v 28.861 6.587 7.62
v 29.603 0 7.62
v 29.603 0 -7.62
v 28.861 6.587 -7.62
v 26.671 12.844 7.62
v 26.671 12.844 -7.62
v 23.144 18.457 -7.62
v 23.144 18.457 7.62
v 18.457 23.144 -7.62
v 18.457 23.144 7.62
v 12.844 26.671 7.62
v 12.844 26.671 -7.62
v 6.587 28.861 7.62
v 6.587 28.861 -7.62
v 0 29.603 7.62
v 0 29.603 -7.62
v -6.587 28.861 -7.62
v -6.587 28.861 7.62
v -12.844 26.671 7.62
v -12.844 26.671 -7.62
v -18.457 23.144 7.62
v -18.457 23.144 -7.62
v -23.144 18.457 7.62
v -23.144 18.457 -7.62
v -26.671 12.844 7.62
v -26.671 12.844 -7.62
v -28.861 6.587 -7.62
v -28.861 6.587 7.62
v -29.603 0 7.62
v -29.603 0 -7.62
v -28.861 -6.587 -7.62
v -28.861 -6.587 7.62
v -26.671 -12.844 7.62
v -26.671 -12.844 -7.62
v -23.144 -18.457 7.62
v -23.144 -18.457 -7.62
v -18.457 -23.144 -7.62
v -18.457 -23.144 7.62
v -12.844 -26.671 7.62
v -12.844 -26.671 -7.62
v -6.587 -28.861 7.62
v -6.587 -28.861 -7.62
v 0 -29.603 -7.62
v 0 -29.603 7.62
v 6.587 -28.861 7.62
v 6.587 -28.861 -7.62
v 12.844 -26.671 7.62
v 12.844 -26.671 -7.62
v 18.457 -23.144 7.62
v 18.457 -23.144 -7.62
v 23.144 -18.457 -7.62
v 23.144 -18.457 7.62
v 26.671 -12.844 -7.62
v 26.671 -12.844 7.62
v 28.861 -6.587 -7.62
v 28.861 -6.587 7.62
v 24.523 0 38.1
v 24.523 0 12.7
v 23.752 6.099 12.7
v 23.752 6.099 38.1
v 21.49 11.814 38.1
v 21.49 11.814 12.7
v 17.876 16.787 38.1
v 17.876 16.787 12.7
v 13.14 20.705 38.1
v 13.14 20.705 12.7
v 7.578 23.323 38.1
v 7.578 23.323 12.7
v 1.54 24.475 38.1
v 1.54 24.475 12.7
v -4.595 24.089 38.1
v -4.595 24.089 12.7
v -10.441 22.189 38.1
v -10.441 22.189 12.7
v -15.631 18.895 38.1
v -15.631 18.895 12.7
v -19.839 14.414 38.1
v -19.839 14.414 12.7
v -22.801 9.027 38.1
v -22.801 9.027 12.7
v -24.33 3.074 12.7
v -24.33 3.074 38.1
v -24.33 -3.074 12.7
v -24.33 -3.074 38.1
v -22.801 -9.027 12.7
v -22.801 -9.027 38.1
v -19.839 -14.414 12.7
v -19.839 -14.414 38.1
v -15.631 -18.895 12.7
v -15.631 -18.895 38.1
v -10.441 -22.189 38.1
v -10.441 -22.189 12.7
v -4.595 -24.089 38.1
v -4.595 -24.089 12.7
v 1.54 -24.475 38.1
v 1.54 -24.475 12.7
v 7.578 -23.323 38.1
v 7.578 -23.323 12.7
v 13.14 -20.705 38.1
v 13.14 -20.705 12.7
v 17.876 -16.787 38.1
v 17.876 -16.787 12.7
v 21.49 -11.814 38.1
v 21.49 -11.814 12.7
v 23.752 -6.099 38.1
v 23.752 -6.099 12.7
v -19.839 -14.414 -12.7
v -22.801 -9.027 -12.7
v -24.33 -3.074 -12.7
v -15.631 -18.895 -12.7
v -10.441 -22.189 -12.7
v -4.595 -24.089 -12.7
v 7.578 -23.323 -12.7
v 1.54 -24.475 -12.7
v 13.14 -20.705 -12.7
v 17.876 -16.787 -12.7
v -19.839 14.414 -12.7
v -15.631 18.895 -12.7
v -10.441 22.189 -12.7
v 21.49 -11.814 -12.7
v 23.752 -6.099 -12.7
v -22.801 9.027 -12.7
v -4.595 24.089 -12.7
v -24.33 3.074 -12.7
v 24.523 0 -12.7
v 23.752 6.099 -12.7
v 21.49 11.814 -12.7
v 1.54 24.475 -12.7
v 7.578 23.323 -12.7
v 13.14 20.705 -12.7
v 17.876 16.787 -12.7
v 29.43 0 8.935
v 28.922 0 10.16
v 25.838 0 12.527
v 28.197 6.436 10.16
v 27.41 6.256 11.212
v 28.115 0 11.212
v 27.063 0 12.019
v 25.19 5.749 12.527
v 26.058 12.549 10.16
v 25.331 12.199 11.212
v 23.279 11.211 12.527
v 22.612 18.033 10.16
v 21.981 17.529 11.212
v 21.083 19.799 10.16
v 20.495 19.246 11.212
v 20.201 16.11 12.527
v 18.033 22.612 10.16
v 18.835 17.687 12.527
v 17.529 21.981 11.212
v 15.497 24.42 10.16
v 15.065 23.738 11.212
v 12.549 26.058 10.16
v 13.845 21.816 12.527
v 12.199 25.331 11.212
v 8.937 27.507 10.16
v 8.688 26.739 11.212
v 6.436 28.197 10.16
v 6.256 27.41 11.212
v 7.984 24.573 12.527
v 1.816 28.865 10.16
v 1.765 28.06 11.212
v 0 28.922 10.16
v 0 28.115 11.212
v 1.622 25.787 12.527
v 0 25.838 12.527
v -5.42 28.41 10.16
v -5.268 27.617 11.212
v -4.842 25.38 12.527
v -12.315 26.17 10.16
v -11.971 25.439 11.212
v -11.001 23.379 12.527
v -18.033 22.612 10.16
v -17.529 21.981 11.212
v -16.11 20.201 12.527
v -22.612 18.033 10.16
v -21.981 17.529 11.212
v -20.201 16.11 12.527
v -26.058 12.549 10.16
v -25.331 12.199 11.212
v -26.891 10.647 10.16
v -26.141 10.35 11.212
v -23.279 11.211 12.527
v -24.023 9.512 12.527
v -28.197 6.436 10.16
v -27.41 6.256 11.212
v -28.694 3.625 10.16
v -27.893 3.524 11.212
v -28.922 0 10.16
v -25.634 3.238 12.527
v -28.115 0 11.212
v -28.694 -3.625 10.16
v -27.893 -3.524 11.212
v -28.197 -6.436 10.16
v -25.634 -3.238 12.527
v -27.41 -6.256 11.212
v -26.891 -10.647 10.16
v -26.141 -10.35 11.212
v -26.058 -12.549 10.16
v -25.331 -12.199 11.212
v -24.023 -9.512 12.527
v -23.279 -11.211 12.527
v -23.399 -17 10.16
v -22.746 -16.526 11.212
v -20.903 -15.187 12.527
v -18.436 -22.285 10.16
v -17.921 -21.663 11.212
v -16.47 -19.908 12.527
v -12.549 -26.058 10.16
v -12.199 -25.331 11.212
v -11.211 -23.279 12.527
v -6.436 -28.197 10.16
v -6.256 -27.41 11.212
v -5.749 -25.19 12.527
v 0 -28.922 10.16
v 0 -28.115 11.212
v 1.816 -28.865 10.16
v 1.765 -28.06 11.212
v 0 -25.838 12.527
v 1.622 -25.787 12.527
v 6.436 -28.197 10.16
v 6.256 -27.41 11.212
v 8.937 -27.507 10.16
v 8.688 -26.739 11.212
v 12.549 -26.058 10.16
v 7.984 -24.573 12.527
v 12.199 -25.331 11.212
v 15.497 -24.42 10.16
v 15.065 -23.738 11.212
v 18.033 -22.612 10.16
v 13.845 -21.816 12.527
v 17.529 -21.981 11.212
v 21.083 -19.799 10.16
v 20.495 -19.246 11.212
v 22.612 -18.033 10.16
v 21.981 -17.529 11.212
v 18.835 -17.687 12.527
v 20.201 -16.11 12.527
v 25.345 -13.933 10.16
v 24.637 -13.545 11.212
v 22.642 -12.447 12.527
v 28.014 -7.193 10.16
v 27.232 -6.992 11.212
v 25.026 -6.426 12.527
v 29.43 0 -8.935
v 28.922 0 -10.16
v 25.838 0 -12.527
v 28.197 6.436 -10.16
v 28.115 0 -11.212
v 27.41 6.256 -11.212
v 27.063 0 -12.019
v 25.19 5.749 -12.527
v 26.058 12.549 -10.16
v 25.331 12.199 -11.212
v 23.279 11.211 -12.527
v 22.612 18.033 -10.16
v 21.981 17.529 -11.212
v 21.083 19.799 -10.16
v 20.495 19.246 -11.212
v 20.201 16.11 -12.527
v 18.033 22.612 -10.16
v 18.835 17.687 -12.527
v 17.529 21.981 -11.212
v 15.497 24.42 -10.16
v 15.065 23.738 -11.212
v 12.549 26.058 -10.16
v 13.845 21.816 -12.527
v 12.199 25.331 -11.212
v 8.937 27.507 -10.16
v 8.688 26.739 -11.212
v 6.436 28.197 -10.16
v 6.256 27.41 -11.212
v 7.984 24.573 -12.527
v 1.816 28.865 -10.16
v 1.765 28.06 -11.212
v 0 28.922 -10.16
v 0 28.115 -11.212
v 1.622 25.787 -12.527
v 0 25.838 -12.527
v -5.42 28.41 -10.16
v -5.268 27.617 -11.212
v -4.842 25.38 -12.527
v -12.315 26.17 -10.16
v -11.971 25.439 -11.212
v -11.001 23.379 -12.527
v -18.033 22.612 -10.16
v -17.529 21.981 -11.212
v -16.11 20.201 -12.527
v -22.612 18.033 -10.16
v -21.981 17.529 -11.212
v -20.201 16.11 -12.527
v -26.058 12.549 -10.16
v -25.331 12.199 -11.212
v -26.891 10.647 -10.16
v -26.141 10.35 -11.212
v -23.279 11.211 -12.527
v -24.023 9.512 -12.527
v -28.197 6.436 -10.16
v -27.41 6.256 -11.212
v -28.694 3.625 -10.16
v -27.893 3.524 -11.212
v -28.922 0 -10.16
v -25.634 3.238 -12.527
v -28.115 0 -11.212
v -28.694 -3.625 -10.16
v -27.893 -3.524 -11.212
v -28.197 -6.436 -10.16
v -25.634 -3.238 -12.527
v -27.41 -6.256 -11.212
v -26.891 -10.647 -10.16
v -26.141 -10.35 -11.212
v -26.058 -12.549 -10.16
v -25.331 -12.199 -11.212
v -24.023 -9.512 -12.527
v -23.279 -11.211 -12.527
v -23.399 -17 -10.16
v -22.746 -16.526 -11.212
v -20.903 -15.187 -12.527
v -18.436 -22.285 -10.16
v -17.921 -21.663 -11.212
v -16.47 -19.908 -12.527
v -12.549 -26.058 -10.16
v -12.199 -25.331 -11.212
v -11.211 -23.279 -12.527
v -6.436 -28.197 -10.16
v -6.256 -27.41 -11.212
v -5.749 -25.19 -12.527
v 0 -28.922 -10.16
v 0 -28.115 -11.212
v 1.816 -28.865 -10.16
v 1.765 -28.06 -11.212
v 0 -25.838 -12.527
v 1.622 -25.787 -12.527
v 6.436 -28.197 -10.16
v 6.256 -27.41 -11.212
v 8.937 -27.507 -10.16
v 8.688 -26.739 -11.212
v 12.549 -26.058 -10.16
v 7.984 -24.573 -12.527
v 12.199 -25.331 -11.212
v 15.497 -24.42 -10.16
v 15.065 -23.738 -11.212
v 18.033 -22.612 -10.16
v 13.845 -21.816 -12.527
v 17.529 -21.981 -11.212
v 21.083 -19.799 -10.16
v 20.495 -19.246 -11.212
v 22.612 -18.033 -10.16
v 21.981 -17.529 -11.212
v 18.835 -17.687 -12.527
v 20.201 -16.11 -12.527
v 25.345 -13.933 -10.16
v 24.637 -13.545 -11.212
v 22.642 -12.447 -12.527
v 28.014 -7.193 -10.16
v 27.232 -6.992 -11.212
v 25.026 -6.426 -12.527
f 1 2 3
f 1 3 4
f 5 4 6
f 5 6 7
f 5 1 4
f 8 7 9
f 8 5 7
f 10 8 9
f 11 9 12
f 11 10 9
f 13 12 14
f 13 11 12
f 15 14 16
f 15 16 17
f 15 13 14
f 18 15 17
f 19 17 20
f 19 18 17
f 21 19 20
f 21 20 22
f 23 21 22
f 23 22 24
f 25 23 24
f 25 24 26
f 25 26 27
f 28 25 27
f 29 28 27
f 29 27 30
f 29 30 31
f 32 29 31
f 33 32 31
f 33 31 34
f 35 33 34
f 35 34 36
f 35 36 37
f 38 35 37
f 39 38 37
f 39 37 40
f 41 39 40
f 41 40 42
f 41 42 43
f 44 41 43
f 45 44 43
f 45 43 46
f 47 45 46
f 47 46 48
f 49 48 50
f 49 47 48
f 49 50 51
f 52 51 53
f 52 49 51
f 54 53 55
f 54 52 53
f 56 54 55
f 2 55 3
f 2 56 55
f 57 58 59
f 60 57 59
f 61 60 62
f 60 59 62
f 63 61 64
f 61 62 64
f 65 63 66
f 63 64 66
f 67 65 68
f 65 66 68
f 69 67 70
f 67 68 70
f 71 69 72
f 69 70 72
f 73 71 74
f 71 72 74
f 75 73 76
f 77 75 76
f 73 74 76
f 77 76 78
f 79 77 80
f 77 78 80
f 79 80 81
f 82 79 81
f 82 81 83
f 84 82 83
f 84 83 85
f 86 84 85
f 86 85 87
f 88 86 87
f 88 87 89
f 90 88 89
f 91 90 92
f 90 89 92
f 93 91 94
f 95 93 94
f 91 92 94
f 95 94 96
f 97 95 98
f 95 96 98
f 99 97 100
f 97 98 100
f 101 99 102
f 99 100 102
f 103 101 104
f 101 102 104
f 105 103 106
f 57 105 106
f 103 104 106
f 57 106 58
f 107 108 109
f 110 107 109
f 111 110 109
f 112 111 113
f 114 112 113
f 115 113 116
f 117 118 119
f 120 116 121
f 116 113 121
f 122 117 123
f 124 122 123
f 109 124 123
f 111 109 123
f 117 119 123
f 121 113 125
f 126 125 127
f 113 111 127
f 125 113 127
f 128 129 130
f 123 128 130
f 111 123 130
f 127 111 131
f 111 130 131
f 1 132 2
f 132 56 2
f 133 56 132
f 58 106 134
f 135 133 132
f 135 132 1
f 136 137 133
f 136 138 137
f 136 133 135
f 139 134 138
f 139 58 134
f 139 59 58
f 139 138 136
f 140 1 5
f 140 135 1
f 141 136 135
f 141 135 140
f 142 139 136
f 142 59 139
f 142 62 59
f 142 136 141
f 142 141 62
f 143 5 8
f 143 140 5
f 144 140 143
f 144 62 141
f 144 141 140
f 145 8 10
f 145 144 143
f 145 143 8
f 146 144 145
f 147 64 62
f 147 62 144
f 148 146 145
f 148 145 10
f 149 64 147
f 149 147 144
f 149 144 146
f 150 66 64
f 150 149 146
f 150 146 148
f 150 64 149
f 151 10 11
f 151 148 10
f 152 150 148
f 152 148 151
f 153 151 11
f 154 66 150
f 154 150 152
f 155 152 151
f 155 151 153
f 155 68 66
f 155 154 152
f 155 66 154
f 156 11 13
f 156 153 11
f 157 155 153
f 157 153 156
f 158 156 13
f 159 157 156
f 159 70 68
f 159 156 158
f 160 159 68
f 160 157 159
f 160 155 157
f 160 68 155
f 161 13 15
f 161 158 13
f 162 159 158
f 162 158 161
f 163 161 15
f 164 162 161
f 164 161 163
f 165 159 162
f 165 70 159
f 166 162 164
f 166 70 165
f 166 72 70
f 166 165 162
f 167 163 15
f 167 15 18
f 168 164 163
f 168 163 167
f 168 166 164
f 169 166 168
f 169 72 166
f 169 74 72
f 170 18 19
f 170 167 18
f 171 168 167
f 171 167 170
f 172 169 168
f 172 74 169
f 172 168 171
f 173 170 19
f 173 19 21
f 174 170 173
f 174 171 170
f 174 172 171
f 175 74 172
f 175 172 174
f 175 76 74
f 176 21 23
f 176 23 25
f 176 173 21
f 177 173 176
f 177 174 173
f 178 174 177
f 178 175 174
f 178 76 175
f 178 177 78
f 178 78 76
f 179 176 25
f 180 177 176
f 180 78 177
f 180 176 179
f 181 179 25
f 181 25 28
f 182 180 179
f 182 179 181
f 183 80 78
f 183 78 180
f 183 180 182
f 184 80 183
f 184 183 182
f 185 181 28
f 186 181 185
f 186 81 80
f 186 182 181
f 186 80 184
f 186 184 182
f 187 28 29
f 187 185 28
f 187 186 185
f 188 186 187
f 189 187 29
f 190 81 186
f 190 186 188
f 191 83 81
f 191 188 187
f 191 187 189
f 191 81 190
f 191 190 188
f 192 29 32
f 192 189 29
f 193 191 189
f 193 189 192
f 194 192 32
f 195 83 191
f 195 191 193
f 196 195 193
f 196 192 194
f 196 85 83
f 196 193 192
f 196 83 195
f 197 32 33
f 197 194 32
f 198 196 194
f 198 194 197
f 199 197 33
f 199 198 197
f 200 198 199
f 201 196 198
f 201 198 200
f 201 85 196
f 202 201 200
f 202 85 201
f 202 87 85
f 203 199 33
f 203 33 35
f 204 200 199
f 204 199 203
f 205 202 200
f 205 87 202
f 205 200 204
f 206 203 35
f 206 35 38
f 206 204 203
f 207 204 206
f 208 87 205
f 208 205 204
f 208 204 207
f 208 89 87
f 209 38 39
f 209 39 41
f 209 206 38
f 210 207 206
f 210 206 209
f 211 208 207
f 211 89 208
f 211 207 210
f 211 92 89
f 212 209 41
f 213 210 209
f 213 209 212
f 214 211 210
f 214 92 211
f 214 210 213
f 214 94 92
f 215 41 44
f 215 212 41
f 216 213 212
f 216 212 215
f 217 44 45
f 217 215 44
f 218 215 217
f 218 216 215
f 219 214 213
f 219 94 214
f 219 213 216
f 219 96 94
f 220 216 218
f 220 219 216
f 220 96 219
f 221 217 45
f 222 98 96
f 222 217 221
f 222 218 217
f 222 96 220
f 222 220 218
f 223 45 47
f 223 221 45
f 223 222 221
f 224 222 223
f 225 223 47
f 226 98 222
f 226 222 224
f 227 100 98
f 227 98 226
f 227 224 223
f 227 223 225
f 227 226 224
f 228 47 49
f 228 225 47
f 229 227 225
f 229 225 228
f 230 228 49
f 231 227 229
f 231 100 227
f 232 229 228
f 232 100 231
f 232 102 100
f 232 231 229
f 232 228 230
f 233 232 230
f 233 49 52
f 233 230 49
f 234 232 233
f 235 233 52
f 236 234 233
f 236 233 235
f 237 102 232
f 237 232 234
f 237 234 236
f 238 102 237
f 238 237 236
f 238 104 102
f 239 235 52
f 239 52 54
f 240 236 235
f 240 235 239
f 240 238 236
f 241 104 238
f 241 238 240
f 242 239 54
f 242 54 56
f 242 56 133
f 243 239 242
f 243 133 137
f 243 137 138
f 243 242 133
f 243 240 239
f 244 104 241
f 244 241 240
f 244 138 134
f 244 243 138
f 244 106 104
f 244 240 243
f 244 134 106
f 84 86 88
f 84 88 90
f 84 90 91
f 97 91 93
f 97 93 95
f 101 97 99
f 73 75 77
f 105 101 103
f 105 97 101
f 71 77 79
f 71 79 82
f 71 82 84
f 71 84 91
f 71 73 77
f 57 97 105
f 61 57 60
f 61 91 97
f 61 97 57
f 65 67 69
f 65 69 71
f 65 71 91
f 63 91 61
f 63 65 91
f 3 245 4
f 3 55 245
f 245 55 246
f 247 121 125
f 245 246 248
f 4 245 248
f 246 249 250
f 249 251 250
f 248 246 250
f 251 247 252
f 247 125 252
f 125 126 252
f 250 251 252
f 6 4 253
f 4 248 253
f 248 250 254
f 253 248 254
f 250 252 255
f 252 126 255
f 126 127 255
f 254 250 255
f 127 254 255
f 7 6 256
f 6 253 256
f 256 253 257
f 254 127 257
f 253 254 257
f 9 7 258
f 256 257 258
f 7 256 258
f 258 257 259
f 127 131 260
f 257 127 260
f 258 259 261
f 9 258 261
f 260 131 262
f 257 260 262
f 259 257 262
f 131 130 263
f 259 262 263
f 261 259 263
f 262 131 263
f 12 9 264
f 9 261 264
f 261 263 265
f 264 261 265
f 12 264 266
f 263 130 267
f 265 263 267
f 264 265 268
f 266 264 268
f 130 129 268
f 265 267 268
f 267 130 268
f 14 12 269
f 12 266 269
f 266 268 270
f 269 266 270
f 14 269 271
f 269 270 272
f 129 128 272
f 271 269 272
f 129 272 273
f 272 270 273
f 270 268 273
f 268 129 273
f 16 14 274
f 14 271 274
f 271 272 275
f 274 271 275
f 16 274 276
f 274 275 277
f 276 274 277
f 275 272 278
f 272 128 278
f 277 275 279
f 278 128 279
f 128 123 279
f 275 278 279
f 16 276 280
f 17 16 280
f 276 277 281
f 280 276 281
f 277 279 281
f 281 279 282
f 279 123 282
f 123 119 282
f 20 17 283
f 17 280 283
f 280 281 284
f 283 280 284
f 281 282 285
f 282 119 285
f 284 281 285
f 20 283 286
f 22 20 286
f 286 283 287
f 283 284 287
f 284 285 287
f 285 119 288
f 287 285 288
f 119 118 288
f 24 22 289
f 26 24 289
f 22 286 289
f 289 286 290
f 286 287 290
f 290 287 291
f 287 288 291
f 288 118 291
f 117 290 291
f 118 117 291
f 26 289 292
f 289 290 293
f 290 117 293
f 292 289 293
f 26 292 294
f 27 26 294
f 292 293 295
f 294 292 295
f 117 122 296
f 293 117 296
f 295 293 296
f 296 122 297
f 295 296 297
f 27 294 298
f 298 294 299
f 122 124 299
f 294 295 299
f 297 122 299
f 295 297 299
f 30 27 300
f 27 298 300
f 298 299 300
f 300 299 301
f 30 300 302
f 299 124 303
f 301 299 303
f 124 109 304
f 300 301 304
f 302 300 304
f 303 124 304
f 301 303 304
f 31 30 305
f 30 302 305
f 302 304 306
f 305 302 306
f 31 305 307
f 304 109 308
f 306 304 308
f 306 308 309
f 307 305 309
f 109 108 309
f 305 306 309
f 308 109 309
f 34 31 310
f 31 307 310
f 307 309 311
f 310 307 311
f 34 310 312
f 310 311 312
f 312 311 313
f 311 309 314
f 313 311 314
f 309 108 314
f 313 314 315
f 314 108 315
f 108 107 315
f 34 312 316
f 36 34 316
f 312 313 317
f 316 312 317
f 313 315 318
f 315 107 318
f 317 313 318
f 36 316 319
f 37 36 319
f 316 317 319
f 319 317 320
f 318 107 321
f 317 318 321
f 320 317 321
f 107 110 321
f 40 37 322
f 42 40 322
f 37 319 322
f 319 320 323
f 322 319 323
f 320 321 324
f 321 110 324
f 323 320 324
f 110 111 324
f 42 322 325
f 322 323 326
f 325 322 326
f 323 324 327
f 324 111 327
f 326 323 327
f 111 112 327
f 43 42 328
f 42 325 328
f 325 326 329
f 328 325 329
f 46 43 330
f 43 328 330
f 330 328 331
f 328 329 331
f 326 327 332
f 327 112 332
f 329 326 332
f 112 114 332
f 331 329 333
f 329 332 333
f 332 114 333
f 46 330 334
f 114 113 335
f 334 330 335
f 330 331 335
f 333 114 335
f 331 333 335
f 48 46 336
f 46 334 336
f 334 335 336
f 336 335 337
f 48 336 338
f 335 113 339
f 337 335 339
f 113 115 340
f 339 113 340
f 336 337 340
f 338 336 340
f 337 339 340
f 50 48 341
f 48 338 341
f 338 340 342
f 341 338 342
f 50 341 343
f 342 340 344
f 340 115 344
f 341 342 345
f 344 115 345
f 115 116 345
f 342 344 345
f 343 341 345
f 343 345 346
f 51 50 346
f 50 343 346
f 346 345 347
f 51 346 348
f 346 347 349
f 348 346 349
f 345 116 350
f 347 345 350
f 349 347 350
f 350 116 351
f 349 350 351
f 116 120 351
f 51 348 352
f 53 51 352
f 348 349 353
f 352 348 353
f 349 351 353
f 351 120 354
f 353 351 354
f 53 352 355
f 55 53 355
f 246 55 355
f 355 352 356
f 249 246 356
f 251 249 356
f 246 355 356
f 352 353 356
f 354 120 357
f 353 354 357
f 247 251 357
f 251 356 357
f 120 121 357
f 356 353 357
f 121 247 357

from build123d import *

# Parameters (mm, degrees)
F0_R     = 29.6029222689
F1_DEPTH = 12.7
F2_R     = 5.08
F3_DEPTH = 25.4


with BuildPart() as f1:
    # F0 (on Top) → F1 (new body, symmetric)
    with BuildSketch(Plane.XY):
        Circle(F0_R)
    extrude(amount=F1_DEPTH, both=True)

    # F2
    f2_edges = [f1.edges().sort_by_distance(p)[0] for p in [
        (-29.602922, 0, 12.7),
        (-29.602922, 0, -12.7),
    ]]
    fillet(f2_edges, radius=F2_R)

    # F3 (add): a face of the model
    f3_faces = [f1.faces().sort_by_distance(p)[0] for p in [
        (0, 0, 12.7),
    ]]
    extrude(f3_faces, amount=F3_DEPTH)


solid = f1.part
